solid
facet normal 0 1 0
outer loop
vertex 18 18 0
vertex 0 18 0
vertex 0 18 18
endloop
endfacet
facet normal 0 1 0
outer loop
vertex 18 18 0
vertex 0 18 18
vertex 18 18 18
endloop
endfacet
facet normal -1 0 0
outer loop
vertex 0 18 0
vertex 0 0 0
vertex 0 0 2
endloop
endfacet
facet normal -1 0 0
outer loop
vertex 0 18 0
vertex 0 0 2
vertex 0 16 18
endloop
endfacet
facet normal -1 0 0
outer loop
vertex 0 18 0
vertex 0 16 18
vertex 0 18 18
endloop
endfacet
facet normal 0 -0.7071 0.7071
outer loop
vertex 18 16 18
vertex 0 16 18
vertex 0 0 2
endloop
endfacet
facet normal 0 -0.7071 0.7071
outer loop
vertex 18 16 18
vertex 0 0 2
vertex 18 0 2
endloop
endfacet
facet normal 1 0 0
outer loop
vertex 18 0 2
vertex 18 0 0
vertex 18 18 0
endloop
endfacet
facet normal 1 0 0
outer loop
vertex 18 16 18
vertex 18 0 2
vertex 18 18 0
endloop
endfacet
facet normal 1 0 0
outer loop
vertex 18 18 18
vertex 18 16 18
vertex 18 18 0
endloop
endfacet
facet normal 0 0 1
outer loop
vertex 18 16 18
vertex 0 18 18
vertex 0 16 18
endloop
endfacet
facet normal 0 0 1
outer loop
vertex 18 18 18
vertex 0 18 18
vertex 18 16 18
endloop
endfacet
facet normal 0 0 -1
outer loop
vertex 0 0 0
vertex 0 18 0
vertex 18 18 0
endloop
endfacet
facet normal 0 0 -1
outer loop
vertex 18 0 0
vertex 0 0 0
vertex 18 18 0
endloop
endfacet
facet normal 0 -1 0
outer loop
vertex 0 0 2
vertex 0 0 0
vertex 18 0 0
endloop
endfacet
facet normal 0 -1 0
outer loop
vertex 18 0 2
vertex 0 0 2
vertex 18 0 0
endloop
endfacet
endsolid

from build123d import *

# Parameters (mm, degrees)
SKETCH_W     = 18
SKETCH_H     = 18
PAD_DEPTH    = 18
CHAMFER_SIZE = 16


with BuildPart() as part:
    # Sketch → Pad (new body)
    with BuildSketch(Plane.XY):
        with Locations((9, 9)):
            Rectangle(SKETCH_W, SKETCH_H)
    extrude(amount=PAD_DEPTH)

    # Chamfer
    chamfer_edges = [part.edges().sort_by_distance(p)[0] for p in [
        (9, 0, 18),
    ]]
    chamfer(chamfer_edges, length=CHAMFER_SIZE)


solid = part.part
